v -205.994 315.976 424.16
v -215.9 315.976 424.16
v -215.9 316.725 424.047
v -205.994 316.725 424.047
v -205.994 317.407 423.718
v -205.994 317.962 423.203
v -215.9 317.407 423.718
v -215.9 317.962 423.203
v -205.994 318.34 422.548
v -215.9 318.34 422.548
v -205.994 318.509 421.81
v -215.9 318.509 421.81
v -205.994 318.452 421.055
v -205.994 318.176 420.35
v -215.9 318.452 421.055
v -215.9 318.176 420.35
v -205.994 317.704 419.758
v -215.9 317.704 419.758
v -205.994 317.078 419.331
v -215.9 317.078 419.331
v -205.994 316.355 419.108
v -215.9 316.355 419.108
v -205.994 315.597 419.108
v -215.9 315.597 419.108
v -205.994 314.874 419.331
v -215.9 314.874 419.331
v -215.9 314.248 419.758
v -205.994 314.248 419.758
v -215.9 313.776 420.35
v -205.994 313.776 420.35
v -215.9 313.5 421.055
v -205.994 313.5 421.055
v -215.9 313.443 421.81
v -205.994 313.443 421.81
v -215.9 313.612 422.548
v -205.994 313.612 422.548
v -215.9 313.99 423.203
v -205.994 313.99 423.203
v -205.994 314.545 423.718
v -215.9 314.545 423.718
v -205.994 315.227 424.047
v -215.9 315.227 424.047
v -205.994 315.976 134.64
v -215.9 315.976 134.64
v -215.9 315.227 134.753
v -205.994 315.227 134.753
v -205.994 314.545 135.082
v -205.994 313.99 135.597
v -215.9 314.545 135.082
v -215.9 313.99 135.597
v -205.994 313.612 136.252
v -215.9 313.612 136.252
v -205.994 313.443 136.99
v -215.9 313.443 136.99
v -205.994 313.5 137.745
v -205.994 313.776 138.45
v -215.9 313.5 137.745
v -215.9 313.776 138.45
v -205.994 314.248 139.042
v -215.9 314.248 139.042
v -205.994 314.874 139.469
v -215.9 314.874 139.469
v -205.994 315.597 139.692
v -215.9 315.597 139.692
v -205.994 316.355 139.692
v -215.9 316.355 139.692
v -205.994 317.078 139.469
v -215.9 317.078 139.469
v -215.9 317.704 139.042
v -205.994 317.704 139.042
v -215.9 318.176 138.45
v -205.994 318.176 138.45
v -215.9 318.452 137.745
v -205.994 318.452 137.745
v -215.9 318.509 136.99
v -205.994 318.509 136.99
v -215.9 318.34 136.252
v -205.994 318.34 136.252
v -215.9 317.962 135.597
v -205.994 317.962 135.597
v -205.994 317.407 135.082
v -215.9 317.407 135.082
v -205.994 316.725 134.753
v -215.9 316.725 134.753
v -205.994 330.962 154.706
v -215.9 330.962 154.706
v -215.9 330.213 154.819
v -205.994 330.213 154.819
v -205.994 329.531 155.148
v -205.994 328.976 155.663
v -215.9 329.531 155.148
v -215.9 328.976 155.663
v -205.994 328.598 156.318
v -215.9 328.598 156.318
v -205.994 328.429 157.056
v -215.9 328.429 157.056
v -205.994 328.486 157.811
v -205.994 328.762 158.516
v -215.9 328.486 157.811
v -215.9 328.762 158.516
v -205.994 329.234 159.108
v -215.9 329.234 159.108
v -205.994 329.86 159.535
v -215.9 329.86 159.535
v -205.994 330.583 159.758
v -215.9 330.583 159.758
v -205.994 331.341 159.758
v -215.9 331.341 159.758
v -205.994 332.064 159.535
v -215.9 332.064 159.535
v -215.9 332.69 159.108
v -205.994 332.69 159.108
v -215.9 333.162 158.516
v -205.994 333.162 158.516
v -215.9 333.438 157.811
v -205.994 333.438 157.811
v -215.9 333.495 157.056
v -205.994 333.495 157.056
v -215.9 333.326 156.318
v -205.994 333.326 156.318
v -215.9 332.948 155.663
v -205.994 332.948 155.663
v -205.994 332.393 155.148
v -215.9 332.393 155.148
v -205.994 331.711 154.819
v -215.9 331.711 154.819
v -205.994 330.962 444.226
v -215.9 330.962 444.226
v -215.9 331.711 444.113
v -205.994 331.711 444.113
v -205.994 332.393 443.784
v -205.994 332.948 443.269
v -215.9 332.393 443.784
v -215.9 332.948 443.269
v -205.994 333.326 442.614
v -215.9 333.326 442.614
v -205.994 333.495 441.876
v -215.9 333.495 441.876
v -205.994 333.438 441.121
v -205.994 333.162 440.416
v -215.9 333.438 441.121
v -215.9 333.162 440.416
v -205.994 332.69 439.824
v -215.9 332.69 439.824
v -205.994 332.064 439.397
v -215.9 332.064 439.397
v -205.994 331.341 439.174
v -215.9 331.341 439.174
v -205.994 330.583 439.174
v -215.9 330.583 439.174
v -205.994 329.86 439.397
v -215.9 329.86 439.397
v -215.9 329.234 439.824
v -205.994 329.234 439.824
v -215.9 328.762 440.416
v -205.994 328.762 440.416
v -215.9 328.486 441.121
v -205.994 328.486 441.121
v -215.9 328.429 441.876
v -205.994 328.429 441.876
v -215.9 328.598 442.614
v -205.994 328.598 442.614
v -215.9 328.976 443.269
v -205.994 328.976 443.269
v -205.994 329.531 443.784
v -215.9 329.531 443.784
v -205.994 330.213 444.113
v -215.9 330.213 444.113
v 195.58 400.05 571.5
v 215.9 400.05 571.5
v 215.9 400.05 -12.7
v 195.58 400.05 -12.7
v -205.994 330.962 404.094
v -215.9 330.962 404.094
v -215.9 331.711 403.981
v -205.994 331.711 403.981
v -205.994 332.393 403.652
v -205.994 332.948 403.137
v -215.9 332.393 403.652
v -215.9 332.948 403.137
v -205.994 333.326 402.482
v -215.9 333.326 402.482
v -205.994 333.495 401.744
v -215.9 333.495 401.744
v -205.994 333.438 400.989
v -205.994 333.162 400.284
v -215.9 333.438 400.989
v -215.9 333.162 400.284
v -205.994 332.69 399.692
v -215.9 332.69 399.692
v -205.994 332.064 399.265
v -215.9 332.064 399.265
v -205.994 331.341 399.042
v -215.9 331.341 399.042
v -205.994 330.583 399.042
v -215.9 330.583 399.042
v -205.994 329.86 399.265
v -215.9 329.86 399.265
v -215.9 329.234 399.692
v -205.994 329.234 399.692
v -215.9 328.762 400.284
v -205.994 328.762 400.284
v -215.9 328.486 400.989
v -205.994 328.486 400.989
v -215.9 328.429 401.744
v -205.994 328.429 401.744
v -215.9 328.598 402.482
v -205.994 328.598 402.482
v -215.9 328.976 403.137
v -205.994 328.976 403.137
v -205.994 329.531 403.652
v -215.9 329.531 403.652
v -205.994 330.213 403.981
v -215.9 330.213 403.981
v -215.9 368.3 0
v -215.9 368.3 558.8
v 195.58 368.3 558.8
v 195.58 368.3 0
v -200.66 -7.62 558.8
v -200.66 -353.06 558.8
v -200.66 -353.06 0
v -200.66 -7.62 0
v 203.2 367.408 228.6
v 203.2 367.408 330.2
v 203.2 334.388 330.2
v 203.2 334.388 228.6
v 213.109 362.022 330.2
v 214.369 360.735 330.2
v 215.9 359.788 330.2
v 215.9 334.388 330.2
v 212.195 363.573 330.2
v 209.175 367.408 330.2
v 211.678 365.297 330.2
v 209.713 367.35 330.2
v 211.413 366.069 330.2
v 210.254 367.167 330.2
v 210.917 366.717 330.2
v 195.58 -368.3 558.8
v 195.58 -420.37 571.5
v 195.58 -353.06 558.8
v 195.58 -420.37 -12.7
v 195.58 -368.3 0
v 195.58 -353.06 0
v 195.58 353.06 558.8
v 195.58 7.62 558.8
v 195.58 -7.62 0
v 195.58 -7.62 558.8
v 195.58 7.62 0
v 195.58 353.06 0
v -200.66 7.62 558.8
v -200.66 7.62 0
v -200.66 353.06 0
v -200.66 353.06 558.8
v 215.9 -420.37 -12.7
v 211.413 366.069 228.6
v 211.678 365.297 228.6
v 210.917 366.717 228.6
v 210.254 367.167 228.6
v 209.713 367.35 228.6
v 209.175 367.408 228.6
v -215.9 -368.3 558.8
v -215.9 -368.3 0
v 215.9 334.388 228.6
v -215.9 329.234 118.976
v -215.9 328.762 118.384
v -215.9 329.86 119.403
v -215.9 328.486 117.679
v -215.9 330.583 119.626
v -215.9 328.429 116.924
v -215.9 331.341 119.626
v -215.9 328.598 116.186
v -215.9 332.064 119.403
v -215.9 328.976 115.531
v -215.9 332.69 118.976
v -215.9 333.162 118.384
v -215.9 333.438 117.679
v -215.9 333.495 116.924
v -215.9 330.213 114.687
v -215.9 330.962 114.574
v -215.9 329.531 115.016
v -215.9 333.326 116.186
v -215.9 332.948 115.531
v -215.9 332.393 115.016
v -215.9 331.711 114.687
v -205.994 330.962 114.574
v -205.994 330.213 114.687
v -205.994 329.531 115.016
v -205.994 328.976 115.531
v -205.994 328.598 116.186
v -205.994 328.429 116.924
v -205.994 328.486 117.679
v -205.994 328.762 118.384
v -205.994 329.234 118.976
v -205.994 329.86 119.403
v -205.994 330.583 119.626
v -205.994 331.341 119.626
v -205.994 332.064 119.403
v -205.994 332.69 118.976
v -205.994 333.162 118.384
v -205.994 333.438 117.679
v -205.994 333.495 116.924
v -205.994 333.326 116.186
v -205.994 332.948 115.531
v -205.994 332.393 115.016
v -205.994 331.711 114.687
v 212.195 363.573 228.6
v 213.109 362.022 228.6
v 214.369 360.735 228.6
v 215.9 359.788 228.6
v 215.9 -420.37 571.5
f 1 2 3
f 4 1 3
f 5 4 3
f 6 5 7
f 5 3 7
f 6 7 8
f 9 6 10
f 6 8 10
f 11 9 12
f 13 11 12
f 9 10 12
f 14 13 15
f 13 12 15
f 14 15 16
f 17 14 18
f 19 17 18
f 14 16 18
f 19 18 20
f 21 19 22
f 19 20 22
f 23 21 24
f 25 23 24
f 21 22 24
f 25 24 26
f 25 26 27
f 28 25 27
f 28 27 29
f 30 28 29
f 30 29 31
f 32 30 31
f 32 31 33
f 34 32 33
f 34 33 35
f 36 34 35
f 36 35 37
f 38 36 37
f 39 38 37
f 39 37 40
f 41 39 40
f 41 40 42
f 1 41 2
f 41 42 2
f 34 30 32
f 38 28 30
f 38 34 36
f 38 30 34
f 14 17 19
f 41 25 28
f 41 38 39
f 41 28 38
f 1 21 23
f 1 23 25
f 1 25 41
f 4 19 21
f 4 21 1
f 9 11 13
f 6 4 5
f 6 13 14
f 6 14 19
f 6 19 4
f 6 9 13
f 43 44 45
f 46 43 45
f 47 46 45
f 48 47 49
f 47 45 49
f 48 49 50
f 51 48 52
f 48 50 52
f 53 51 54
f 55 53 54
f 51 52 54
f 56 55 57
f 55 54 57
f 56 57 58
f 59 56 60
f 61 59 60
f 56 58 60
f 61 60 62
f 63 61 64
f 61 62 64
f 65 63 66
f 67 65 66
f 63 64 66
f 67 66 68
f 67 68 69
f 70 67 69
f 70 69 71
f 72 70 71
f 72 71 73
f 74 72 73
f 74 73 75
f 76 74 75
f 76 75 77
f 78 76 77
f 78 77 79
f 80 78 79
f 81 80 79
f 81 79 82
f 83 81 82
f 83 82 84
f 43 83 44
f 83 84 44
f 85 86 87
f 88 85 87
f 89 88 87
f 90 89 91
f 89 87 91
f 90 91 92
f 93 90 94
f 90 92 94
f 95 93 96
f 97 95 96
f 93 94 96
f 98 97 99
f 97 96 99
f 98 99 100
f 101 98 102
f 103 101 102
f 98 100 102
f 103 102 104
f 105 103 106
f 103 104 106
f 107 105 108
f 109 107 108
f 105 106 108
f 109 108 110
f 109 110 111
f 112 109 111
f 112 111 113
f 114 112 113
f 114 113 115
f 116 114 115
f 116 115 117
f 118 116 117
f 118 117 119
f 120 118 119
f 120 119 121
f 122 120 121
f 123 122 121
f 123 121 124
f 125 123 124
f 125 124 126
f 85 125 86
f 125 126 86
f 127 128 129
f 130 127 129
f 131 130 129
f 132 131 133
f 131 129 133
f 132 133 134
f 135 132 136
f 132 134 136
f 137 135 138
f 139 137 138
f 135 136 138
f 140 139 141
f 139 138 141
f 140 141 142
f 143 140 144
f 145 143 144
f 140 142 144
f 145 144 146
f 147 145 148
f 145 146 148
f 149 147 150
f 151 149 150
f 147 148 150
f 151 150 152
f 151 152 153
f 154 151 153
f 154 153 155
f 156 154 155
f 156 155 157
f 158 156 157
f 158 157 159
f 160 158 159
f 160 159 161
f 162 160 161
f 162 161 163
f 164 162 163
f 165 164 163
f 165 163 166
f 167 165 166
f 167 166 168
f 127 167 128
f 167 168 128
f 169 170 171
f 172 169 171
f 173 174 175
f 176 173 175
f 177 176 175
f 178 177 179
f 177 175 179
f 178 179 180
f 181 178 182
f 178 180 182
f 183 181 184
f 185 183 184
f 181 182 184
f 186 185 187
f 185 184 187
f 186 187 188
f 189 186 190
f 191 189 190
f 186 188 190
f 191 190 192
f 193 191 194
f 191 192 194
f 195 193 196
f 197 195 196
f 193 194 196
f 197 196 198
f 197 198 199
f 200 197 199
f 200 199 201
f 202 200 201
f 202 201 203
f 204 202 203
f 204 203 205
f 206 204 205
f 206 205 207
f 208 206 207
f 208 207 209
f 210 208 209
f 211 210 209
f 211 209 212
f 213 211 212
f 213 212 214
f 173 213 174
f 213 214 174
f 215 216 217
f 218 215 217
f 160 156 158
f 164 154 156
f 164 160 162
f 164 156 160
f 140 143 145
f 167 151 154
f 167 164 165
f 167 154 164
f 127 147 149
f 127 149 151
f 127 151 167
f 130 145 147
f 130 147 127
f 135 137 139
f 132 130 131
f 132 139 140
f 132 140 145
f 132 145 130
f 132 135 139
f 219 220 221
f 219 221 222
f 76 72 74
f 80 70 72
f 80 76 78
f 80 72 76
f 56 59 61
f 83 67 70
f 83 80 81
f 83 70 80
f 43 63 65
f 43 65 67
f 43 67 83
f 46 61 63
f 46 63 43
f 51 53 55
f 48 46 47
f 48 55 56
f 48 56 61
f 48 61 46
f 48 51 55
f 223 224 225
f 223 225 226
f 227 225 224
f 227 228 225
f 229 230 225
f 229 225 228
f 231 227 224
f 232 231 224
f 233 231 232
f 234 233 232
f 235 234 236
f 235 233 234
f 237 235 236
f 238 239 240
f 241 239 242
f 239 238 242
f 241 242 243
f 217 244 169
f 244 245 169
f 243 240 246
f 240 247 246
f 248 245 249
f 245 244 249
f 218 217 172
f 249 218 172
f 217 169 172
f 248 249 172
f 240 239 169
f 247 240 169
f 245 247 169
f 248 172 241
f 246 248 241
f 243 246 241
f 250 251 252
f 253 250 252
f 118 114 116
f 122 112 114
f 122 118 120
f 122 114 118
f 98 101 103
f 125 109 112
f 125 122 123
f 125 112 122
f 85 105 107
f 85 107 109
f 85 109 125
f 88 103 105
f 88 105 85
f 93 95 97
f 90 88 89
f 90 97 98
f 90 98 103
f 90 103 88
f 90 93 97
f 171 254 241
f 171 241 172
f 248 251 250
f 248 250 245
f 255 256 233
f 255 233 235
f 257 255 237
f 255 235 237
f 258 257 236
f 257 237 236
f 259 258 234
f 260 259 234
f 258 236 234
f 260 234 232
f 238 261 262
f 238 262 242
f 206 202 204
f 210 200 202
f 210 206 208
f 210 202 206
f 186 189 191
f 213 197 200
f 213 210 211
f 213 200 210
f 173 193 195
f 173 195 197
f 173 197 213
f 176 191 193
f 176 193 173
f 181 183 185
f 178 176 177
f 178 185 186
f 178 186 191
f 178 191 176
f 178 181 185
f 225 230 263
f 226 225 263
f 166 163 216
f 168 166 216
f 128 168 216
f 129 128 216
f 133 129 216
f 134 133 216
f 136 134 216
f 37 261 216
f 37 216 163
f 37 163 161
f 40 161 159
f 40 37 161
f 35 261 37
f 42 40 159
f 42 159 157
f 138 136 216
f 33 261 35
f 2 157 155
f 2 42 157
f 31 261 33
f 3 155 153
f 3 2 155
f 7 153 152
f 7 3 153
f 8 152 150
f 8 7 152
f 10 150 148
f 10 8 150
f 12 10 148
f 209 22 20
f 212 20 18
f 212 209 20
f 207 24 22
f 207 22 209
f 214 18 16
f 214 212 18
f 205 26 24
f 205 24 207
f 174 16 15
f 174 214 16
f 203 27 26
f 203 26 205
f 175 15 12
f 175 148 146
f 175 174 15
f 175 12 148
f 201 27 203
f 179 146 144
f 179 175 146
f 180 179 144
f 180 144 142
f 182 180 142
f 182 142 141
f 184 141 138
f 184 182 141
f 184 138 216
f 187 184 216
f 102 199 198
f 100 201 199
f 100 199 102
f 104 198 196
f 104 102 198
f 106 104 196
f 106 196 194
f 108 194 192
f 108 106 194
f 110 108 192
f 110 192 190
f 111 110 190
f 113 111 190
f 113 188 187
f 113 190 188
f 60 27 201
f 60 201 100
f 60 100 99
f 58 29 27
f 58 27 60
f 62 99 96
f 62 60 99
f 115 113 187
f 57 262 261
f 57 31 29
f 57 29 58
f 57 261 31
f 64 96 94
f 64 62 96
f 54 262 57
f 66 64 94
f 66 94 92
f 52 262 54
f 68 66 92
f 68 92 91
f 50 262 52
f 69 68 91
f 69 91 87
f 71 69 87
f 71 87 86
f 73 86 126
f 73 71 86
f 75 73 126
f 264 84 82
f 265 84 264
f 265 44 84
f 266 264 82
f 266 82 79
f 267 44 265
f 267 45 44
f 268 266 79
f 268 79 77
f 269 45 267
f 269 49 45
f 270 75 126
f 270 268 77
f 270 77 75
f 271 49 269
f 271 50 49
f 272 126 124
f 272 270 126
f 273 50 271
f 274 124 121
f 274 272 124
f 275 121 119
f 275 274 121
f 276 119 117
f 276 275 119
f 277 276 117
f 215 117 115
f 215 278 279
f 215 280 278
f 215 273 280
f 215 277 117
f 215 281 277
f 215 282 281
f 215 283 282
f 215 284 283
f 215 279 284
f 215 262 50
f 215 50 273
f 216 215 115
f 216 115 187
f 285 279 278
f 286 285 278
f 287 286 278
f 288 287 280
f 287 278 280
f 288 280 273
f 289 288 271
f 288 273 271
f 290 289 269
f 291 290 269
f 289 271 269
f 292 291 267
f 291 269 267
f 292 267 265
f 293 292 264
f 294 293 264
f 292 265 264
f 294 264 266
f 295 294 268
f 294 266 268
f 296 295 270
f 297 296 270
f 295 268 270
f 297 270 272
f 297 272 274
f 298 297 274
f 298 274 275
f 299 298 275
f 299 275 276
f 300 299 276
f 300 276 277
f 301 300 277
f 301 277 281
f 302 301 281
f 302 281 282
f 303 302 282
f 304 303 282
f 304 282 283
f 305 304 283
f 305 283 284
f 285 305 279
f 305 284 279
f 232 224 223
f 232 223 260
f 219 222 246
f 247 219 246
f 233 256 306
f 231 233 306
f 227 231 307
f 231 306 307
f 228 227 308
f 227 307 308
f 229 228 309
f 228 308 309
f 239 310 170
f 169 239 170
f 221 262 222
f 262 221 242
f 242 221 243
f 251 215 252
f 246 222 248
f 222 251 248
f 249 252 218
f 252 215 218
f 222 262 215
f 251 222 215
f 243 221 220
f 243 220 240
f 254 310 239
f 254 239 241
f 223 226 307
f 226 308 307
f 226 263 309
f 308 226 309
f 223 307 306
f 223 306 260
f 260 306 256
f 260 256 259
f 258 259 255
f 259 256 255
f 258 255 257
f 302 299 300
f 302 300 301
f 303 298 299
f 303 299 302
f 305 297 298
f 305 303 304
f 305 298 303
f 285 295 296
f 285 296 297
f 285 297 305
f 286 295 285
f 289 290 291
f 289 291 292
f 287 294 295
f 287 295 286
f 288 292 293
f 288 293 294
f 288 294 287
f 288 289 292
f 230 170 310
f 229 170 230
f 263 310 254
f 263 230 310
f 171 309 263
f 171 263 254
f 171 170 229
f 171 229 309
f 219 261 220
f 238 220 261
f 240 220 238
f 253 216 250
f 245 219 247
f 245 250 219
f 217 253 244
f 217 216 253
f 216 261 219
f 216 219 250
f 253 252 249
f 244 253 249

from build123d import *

# Parameters (mm, degrees)
SKETCH1_W           = 431.8
SKETCH1_H           = 736.6
SKETCH1_W_2         = 401.32
SKETCH1_H_2         = 706.12
SKETCH1_H_3         = 15.24
BOSS_EXTRUDE1_DEPTH = 558.8
SKETCH3_W           = 584.2
SKETCH3_H           = 820.42
BOSS_EXTRUDE2_DEPTH = 20.32
SKETCH4_W           = 101.6
SKETCH4_H           = 25.4
CUT_EXTRUDE1_DEPTH  = 12.7
CUT_EXTRUDE2_DEPTH  = 7.62
FILLET1_R           = 7.46
FILLET2_R           = 2.54
SKETCH6_R           = 2.54
CUT_EXTRUDE3_DEPTH  = 9.906


with BuildPart() as part:
    # Sketch1 → Boss-Extrude1 (new body)
    # profile 1 of 2: a face of its own
    with BuildSketch(Plane.XY):
        Rectangle(SKETCH1_W, SKETCH1_H)
        Rectangle(SKETCH1_W_2, SKETCH1_H_2, mode=Mode.SUBTRACT)
    # profile 2 of 2: a face of its own
    with BuildSketch(Plane.XY):
        Rectangle(SKETCH1_W_2, SKETCH1_H_3)
    extrude(amount=BOSS_EXTRUDE1_DEPTH)

    # Sketch3 → Boss-Extrude2 (add)
    with BuildSketch(Plane(origin=(215.9, 0, 0), x_dir=(0, 0, -1), z_dir=(1, 0, 0))):
        with Locations((-279.4, -10.16)):
            Rectangle(SKETCH3_W, SKETCH3_H)
    extrude(amount=-BOSS_EXTRUDE2_DEPTH)

    # Sketch4 → Cut-Extrude1 (cut)
    with BuildSketch(Plane(origin=(215.9, 0, 0), x_dir=(0, 0, -1), z_dir=(1, 0, 0))):
        with Locations((-279.4, 347.087877014)):
            Rectangle(SKETCH4_W, SKETCH4_H)
    extrude(amount=-CUT_EXTRUDE1_DEPTH, mode=Mode.SUBTRACT)

    # Sketch5 → Cut-Extrude2 (cut)
    with BuildSketch(Plane.XZ.offset(-359.787877014)):
        Polygon((211.571045912, 228.6), (211.571045912, 330.2), (207.242091825, 330.2), (203.2, 330.2), (203.2, 228.6), (207.242091825, 228.6), align=None)
    extrude(amount=-CUT_EXTRUDE2_DEPTH, mode=Mode.SUBTRACT)

    # Fillet1
    # the kernel refuses this fillet: 7.46 mm, written as the material it takes off along each edge
    with BuildSketch(Plane(origin=(211.571045912, 359.787877014, 228.6), x_dir=(0, 1, 0), z_dir=(0, 0, 1))) as fillet1_piece_1:
        with BuildLine():
            CenterArc((6.771126309, -7.46), FILLET1_R, 90, 65.183641266)
            Line((0, -4.328954088), (-0.135422526, -4.266333169))
            ThreePointArc((-0.135422526, -4.266333169), (-0.1492, -2.164477044), (-0.1492, 0))
            Line((-0.1492, 0), (0, 0.1492))
            Line((0, 0.1492), (6.771126309, 0.1492))
            Line((6.771126309, 0.1492), (6.771126309, 0))
        make_face()
    extrude(amount=101.6, mode=Mode.SUBTRACT)

    # Fillet2
    fillet2_edges = [part.edges().sort_by_distance(p)[0] for p in [
        (211.571045912, 367.407877014, 279.4),
    ]]
    fillet(fillet2_edges, radius=FILLET2_R)

    # Sketch6 → Cut-Extrude3 (cut)
    with BuildSketch(Plane.ZY.offset(215.9)):
        with Locations((441.685832518, 330.962)):
            Circle(SKETCH6_R)
        with Locations((401.553832518, 330.962)):
            Circle(SKETCH6_R)
        with Locations((421.619832518, 315.976)):
            Circle(SKETCH6_R)
        with Locations(Location((137.180167482, 315.976, 0), (0, 0, 180))):
            Circle(SKETCH6_R)
        with Locations(Location((157.246167482, 330.962, 0), (0, 0, 180))):
            Circle(SKETCH6_R)
        with Locations(Location((117.114167482, 330.962, 0), (0, 0, 180))):
            Circle(SKETCH6_R)
    extrude(amount=-CUT_EXTRUDE3_DEPTH, mode=Mode.SUBTRACT)


solid = part.part
